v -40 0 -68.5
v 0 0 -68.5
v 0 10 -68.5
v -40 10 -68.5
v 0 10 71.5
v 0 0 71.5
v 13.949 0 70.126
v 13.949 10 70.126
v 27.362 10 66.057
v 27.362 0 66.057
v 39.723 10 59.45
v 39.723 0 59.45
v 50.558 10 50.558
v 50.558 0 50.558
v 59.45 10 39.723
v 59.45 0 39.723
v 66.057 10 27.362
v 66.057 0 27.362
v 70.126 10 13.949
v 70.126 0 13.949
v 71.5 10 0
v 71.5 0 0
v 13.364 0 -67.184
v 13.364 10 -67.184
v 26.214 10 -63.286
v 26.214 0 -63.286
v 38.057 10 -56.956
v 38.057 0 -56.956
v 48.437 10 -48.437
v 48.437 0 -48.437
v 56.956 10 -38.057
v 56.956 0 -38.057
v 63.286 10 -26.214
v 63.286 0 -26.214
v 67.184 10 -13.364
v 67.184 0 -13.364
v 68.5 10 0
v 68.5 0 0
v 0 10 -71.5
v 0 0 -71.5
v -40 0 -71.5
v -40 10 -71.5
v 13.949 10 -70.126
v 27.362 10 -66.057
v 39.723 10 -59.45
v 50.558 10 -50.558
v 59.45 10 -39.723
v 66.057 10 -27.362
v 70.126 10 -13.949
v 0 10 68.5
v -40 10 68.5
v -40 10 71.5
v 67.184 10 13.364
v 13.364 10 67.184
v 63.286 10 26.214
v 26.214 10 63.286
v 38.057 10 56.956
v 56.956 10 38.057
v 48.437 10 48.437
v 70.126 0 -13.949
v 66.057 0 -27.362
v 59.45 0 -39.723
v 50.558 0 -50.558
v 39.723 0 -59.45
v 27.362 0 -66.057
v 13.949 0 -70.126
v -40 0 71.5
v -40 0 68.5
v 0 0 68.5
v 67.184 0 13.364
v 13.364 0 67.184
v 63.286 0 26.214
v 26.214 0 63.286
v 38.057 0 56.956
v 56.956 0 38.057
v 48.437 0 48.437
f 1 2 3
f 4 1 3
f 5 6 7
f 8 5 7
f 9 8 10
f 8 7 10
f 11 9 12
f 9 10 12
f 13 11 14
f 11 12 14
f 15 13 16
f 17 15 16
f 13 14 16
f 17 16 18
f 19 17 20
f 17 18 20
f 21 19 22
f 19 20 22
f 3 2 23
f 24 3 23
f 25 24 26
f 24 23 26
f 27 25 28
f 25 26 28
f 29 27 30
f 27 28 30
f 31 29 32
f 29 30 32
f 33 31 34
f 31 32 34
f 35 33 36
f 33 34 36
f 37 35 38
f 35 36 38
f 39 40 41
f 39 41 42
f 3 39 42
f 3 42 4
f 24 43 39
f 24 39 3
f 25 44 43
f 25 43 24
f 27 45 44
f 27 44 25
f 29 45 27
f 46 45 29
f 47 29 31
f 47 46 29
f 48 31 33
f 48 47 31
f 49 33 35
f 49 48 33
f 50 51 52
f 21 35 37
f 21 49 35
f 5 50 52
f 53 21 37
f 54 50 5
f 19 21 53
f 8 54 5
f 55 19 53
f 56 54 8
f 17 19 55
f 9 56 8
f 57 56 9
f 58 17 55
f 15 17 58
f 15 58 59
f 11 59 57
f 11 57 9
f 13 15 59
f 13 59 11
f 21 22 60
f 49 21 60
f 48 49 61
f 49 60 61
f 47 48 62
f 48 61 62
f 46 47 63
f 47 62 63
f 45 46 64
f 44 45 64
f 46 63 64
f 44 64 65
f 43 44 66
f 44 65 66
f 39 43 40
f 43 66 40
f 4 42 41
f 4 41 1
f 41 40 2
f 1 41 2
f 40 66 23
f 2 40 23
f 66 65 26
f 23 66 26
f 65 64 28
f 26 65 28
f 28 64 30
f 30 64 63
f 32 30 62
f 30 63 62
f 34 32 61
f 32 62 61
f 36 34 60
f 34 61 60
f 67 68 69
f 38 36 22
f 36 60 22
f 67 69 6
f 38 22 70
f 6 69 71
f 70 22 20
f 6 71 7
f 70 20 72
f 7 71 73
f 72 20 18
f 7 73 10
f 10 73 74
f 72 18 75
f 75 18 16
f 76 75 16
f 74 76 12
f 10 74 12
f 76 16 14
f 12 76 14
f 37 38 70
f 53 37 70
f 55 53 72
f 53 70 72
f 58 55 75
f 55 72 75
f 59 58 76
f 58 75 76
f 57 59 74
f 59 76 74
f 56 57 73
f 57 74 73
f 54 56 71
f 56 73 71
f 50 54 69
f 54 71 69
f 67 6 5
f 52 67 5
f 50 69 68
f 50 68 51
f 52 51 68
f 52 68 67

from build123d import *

# Parameters (mm, degrees)
BOSS_EXTRU_1_DEPTH = 10
ESQUISSE3_W        = 3
ESQUISSE3_H        = 10
BOSS_EXTRU_2_DEPTH = 40


with BuildPart() as part:
    # Esquisse2 → Boss.-Extru.1 (new body)
    with BuildSketch(Plane(origin=(0, 0, 0), x_dir=(1, 0, 0), z_dir=(0, 1, 0))):
        with BuildLine():
            Line((0, 71.5), (0, 68.5))
            ThreePointArc((0, 68.5), (48.436814511, 48.436814511), (68.5, 0))
            ThreePointArc((68.5, 0), (48.436814511, -48.436814511), (0, -68.5))
            Line((0, -68.5), (0, -71.5))
            ThreePointArc((0, -71.5), (50.558134855, -50.558134855), (71.5, 0))
            ThreePointArc((71.5, 0), (50.558134855, 50.558134855), (0, 71.5))
        make_face()
    extrude(amount=BOSS_EXTRU_1_DEPTH)

    # Esquisse3 → Boss.-Extru.2 (add)
    with BuildSketch(Plane.ZY):
        with Locations((-70, 5)):
            Rectangle(ESQUISSE3_W, ESQUISSE3_H)
        with Locations((70, 5)):
            Rectangle(ESQUISSE3_W, ESQUISSE3_H)
    extrude(amount=BOSS_EXTRU_2_DEPTH)


solid = part.part
